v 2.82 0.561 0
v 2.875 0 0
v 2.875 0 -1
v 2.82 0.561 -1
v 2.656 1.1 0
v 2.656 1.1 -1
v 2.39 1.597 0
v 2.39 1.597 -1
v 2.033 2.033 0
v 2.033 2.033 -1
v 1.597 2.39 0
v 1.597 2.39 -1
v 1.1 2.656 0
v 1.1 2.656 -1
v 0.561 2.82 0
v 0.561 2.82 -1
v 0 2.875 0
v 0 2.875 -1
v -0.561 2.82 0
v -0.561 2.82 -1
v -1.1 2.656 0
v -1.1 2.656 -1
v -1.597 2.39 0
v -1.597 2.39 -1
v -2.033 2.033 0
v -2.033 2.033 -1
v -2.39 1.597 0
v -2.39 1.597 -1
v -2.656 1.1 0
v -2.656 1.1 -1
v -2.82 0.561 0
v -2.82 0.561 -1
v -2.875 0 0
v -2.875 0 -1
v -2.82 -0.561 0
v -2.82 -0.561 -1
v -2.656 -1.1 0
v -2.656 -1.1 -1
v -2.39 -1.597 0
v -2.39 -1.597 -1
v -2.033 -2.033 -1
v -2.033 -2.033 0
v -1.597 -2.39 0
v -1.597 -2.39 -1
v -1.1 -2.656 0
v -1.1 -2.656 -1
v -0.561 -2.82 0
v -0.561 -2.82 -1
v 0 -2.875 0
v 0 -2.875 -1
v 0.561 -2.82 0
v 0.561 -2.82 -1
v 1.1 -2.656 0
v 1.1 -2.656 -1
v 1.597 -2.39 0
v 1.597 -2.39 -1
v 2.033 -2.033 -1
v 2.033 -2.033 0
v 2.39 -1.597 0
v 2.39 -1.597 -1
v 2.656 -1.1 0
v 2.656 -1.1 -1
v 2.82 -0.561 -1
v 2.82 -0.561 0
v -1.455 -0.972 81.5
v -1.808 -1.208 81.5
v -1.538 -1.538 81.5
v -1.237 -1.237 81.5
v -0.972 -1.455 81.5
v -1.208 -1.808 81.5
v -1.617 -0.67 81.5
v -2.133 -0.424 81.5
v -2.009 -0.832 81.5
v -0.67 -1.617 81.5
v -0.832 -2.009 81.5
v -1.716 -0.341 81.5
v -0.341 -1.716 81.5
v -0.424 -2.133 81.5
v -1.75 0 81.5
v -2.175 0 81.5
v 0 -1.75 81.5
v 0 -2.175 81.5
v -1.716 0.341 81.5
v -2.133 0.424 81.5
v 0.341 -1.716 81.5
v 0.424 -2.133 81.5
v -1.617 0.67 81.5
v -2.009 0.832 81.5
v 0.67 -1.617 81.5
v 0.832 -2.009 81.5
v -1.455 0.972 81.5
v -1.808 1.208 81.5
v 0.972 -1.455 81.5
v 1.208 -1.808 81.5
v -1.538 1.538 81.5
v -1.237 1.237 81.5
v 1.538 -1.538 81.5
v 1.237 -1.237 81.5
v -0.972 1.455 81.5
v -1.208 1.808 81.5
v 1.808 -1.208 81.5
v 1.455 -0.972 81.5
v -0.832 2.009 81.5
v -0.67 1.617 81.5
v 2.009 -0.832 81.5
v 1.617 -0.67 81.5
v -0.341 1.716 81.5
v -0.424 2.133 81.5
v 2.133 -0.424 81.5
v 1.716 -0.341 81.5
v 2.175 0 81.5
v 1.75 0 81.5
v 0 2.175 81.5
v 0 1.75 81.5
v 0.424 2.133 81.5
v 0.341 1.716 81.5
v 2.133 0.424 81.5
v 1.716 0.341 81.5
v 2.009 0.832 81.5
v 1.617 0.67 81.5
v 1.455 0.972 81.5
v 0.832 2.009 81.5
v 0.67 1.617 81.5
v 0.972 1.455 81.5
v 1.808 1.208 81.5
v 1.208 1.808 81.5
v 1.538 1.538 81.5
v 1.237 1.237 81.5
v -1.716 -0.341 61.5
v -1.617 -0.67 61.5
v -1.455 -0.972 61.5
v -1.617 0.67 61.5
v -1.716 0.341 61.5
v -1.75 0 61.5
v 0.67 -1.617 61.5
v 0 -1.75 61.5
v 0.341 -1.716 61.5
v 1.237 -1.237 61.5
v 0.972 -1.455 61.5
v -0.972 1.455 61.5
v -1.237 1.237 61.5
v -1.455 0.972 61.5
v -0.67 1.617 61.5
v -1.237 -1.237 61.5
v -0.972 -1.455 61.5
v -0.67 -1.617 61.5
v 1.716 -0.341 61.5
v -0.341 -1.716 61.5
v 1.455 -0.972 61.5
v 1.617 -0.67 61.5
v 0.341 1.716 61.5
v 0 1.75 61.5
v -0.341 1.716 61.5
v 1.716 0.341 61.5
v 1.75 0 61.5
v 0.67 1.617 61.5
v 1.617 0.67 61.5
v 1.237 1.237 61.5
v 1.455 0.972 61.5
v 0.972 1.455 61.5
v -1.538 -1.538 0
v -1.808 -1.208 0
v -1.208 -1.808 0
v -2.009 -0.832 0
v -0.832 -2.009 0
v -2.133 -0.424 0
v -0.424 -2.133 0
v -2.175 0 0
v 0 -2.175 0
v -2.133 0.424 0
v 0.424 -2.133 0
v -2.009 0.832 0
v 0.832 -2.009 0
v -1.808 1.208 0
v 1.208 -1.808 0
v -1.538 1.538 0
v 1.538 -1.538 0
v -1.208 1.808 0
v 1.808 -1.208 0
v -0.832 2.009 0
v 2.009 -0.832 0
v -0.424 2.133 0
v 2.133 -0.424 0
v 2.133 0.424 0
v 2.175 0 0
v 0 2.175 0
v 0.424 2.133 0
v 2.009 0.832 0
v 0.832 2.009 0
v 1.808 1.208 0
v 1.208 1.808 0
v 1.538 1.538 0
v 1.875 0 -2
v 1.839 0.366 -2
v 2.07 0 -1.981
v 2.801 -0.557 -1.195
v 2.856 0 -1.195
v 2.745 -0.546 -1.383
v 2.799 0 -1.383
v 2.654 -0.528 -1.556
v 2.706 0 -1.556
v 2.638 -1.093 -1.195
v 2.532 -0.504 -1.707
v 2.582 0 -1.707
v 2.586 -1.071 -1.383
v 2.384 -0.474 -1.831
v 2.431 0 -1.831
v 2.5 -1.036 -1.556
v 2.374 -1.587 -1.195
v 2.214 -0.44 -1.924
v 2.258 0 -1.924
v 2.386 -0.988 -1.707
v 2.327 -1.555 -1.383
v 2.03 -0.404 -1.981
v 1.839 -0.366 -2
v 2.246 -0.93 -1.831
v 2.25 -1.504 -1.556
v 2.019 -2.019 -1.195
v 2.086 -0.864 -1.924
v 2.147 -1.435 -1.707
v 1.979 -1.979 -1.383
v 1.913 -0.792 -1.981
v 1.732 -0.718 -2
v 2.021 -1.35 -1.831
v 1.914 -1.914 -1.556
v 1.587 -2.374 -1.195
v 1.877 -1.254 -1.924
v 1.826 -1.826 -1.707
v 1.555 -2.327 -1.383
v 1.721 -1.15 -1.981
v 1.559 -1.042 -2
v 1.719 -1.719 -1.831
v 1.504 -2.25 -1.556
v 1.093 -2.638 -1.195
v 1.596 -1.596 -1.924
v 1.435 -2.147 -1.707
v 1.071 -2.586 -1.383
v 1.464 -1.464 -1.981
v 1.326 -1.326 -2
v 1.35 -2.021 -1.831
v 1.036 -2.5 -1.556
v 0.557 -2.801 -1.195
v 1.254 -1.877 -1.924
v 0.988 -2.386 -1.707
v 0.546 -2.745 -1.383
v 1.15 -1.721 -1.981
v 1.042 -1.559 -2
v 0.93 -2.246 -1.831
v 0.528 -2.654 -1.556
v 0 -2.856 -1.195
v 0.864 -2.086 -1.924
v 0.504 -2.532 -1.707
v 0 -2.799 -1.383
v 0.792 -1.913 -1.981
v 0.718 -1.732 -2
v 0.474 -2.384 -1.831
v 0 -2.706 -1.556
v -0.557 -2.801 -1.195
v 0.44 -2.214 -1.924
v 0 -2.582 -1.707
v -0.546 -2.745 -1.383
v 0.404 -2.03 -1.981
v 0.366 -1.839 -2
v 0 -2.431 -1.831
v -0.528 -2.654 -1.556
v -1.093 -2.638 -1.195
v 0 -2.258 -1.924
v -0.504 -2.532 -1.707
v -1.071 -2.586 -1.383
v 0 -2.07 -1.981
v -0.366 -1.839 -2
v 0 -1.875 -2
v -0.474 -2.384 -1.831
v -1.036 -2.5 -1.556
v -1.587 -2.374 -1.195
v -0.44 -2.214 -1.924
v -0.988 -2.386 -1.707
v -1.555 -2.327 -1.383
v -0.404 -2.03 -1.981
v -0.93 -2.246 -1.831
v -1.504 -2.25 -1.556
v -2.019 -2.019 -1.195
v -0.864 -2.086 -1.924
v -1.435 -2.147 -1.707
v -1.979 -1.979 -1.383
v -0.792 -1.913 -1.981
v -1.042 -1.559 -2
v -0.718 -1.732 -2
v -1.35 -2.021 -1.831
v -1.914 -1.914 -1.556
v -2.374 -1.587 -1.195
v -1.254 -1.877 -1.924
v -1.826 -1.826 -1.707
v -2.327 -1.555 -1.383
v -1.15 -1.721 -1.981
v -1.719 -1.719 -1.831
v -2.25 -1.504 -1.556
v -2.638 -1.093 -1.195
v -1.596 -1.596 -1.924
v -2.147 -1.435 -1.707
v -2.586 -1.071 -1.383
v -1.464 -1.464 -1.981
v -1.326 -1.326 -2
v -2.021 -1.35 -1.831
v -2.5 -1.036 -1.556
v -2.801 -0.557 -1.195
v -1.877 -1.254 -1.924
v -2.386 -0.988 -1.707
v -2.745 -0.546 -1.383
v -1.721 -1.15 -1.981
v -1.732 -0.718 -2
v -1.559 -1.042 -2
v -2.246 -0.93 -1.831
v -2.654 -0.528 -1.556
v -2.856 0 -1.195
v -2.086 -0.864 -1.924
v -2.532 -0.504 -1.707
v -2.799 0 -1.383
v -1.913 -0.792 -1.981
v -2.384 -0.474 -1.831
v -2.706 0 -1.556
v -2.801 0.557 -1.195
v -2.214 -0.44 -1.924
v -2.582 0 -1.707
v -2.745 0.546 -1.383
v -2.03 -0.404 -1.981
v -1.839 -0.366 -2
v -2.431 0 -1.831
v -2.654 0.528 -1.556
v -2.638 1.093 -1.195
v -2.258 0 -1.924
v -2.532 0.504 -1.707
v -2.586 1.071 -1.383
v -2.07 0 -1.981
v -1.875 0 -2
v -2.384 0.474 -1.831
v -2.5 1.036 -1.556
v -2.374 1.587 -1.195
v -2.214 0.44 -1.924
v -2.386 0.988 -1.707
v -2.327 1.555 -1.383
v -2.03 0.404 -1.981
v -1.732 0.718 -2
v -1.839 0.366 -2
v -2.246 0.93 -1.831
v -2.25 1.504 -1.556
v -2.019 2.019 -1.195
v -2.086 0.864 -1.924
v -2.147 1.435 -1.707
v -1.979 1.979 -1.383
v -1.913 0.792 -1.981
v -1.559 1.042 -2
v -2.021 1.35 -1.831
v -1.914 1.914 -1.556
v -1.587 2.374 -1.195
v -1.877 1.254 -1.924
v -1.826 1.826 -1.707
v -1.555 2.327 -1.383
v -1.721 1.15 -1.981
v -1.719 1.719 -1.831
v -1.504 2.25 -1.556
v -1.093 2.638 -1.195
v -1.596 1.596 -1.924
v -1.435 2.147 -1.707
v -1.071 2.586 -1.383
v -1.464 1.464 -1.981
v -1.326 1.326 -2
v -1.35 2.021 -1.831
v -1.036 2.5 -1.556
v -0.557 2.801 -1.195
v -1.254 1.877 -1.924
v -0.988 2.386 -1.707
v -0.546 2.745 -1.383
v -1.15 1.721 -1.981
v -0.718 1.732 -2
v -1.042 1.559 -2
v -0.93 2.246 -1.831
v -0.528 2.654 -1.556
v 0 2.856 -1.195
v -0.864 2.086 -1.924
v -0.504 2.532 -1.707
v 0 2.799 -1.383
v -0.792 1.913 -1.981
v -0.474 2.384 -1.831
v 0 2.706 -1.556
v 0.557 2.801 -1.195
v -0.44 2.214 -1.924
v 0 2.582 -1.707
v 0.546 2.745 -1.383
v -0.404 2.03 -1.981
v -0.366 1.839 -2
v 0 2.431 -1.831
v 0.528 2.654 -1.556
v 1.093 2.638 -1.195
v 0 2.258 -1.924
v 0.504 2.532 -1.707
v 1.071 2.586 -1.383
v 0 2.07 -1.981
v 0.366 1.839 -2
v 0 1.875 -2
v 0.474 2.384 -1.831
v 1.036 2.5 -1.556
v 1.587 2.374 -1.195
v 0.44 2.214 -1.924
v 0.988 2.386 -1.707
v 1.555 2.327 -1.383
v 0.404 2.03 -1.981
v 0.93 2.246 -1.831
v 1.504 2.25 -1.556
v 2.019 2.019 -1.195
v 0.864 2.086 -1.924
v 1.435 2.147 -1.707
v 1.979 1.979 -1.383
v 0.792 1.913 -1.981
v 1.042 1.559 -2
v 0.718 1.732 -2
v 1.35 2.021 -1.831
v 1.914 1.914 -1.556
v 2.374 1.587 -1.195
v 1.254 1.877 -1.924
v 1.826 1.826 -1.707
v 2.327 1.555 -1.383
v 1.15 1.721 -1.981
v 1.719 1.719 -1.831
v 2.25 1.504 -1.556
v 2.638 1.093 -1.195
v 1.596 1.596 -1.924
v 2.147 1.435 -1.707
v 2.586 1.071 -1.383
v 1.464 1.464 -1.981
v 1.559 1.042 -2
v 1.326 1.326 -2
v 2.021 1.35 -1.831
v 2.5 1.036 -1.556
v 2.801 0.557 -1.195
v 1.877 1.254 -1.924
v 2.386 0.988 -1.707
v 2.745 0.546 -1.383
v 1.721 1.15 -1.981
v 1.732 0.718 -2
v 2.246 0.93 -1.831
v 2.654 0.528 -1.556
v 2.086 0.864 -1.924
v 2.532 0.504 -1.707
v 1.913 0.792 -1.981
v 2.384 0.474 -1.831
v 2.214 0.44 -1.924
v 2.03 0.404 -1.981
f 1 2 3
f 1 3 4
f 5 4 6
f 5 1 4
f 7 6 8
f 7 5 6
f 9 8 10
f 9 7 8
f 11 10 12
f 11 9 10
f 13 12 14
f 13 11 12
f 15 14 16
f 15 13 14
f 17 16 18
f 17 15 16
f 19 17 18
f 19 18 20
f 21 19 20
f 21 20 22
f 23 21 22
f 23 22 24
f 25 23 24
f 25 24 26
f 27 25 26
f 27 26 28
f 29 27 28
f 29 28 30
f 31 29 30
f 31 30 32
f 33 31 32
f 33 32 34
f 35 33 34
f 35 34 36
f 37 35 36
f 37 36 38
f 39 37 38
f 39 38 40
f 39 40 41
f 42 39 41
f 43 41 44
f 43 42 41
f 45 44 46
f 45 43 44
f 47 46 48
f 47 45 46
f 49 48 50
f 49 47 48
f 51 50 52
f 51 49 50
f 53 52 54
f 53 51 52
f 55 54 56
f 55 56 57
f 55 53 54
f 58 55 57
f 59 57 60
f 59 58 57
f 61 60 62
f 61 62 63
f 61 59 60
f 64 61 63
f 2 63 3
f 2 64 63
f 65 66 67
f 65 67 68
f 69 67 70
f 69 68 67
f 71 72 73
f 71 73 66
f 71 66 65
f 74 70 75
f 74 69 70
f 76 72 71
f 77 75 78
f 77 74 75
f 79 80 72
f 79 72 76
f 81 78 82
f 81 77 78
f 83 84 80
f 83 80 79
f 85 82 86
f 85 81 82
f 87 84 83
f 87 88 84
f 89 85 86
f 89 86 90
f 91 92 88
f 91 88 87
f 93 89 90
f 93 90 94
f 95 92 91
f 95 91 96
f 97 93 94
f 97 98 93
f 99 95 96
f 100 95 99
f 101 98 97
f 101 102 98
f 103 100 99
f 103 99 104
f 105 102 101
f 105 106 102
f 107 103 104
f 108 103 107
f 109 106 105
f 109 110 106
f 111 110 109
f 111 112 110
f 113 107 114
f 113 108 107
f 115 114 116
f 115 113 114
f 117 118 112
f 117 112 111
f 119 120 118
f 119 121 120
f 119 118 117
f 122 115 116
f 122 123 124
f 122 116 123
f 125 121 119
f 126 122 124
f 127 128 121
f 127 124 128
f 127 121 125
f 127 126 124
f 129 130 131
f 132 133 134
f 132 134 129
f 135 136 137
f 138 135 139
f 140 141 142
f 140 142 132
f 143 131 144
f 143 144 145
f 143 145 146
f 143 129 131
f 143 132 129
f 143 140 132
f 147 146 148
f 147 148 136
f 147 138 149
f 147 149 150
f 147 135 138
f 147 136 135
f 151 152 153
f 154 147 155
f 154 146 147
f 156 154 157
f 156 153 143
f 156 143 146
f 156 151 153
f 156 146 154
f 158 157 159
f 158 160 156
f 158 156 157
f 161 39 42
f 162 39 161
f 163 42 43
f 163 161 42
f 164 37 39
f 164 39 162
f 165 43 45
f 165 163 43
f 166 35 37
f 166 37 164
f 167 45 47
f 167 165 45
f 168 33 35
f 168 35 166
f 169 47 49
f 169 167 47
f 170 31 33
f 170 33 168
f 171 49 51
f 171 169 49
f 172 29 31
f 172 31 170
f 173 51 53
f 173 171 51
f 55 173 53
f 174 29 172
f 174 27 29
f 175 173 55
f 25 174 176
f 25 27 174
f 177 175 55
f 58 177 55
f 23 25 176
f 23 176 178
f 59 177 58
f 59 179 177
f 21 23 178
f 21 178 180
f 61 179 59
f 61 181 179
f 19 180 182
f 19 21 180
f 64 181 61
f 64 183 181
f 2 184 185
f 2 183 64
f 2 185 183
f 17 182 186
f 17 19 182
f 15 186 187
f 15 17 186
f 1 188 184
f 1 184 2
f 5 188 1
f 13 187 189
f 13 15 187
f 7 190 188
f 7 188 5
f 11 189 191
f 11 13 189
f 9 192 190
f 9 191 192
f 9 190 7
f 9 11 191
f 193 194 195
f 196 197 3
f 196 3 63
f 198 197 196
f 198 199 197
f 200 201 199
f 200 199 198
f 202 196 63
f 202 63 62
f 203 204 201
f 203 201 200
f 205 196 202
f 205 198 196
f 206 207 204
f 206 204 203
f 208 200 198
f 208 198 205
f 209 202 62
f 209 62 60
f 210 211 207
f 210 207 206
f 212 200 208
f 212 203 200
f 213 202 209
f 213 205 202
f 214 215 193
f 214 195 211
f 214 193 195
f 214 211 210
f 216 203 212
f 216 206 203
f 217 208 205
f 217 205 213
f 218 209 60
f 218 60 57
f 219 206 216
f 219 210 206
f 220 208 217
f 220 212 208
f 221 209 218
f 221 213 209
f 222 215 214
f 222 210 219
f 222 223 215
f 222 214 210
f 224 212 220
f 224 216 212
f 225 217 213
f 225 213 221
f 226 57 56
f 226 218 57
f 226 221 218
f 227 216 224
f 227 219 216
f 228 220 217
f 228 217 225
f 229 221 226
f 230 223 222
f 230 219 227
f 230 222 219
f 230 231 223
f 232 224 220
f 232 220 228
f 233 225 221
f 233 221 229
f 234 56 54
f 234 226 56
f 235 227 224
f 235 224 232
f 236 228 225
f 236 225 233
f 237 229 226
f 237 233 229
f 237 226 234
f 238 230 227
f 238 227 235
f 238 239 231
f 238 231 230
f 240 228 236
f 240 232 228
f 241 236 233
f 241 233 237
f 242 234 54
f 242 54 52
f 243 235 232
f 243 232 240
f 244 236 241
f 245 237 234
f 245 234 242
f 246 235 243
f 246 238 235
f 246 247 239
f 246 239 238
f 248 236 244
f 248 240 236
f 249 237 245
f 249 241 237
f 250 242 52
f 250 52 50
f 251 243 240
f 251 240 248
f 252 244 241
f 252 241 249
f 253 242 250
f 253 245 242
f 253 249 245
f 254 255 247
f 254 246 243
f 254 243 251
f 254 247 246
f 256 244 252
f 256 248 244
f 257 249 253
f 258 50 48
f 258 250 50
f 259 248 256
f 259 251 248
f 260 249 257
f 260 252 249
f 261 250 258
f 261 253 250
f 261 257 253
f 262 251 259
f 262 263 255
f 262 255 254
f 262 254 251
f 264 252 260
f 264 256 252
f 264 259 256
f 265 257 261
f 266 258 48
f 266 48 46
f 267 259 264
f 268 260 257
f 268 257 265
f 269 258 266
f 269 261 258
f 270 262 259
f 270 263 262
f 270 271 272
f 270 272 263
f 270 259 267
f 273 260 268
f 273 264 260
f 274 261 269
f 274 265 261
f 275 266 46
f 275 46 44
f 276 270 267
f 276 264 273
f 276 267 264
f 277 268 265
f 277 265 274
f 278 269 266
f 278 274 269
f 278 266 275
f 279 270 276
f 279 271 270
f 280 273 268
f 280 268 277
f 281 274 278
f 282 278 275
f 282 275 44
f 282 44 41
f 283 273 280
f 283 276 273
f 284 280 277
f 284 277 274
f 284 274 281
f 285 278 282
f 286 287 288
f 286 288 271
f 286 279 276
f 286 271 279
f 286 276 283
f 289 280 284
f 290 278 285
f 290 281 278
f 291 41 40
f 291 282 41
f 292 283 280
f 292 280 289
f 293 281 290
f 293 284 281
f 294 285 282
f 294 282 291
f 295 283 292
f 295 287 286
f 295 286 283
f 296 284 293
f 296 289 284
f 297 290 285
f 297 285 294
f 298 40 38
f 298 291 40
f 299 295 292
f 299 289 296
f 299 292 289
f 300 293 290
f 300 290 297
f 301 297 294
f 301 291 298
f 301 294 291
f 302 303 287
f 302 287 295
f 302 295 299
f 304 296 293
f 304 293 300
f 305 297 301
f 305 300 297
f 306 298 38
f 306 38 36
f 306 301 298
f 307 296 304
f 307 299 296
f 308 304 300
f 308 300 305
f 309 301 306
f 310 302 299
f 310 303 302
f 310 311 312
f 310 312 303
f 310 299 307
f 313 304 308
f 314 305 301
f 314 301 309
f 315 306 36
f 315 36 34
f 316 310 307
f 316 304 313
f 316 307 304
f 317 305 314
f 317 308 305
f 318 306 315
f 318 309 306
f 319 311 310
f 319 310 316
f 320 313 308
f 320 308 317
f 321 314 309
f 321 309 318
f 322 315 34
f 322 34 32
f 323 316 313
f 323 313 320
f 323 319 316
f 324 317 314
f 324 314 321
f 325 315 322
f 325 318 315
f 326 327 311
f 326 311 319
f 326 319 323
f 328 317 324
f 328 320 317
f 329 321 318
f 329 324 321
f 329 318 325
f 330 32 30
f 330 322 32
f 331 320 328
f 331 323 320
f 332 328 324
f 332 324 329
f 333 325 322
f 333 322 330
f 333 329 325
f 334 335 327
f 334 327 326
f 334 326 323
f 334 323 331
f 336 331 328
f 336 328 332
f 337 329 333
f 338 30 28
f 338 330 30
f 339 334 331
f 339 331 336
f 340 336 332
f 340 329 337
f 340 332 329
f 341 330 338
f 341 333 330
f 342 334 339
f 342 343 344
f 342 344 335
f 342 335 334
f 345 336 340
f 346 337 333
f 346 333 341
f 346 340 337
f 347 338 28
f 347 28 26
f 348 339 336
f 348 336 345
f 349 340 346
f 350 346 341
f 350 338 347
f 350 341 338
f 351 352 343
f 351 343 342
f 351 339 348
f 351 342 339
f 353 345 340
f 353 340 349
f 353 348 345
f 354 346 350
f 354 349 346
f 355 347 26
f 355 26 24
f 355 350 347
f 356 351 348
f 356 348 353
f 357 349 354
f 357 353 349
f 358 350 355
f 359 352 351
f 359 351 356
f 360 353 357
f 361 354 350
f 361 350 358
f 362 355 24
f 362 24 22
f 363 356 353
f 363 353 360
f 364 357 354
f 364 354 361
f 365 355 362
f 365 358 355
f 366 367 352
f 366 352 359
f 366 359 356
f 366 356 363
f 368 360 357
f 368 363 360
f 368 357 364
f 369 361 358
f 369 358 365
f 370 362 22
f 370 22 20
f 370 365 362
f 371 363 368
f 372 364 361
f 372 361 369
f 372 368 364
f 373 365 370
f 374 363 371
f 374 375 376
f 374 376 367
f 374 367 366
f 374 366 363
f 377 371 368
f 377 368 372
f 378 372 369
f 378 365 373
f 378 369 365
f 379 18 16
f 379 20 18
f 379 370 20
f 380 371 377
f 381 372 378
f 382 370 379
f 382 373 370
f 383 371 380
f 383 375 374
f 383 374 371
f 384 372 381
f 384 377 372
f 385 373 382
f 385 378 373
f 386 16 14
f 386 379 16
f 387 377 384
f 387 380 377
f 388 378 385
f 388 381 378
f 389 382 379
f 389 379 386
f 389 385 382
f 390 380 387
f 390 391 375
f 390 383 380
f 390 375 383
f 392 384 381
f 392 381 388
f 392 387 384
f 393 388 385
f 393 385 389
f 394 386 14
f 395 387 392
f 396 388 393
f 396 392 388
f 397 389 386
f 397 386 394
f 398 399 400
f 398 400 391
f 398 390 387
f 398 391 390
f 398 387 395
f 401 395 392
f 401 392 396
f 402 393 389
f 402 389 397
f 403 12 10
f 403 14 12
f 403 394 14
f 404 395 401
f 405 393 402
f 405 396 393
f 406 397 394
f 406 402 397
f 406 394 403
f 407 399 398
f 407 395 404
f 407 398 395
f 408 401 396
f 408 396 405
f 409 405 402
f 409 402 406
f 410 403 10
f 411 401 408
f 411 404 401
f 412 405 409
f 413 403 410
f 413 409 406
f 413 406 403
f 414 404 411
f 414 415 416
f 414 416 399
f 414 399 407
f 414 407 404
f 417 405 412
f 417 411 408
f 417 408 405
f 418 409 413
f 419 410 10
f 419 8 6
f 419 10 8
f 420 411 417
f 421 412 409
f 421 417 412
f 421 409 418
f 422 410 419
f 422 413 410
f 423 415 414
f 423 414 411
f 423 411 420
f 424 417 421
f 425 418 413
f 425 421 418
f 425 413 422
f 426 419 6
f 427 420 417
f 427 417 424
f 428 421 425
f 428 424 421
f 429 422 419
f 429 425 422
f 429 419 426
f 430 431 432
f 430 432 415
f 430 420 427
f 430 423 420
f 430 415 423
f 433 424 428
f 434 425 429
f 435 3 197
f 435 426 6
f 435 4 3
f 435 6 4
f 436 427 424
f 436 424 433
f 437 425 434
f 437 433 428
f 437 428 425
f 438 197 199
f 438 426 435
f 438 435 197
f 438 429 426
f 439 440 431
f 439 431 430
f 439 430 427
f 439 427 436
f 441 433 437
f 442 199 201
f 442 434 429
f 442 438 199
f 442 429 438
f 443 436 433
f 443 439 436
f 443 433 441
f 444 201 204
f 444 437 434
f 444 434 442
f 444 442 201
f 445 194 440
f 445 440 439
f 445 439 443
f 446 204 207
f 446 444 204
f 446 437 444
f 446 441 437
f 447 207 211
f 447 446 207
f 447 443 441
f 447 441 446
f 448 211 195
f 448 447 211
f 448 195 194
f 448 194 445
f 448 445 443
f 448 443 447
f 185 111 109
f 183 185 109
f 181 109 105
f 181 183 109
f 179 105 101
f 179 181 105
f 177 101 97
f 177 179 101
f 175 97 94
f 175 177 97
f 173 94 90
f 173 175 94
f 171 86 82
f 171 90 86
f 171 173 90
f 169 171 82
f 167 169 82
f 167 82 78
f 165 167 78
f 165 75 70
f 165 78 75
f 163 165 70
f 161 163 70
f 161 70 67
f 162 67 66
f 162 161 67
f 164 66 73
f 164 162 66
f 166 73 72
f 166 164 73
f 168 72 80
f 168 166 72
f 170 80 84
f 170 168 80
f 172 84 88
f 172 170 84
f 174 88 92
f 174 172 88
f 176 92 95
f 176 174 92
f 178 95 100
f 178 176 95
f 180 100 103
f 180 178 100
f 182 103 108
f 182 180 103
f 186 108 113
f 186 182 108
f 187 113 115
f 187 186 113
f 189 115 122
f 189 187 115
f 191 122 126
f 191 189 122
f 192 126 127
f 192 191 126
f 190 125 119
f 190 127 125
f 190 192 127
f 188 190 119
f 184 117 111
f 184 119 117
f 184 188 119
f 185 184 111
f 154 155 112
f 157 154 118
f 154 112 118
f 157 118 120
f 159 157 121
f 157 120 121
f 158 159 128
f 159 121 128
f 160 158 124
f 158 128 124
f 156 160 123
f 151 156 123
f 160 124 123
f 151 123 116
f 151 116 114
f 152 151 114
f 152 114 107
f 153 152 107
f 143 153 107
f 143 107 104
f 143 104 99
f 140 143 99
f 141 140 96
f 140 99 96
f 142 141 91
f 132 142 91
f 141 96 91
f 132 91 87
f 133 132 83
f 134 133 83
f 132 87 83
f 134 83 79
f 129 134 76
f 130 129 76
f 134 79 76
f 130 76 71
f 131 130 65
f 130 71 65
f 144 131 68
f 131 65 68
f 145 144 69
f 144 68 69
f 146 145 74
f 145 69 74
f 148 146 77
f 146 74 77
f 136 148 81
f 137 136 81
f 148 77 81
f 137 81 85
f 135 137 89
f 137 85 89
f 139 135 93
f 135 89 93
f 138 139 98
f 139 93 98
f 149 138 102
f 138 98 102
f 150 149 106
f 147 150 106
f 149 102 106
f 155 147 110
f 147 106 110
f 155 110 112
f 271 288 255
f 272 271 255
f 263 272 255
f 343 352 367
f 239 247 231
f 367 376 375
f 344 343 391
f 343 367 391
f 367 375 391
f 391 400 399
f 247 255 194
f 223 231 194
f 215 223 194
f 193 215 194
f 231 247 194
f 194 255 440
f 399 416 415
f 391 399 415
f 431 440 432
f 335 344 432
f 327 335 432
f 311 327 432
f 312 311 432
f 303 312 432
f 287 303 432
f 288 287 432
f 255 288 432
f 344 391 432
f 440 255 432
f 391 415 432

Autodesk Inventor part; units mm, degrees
ref_plane "YZ Plane" through (0, 0, 0) normal (1, 0, 0) x (0, 1, 0)
ref_plane "XZ Plane" through (0, 0, 0) normal (0, 1, 0) x (-1, 0, 0)
ref_plane "XY Plane" through (0, 0, 0) normal (0, 0, 1) x (1, 0, 0)
sketch "Sketch1" plane through (0, 0, 0) normal (0, 0, 1) x (1, 0, 0)
  circle A0 centre (0, 0) radius 2.175
  circle A1 centre (0, 0) radius 1.75
  circle A2 centre (0, 0) radius 2.875
  circle A3 centre (0, 0) radius 2.25
  dimension "d0" = 4.35
  dimension "d1" = 3.5
  dimension "d2" = 5.75
  dimension "d3" = 4.5
extrude "Extrusion1" add sketch "Sketch1" along normal blind 81.5 contours A0 | A1
extrude "Extrusion2" add sketch "Sketch1" against normal blind 2 contours A0 | A1 | A2 | A3
fillet "Fillet1" radius 1 1 edges at (-2.875, 0, -2)
sketch "Sketch2" plane through (0, 0, 81.5) normal (0, 0, 1) x (1, 0, 0)
  circle A0 centre (0, 0) radius 1.75
  dimension "d9" = 3.5
extrude "Extrusion3" cut sketch "Sketch2" against normal blind 20
properties part number "Schanier pin"
